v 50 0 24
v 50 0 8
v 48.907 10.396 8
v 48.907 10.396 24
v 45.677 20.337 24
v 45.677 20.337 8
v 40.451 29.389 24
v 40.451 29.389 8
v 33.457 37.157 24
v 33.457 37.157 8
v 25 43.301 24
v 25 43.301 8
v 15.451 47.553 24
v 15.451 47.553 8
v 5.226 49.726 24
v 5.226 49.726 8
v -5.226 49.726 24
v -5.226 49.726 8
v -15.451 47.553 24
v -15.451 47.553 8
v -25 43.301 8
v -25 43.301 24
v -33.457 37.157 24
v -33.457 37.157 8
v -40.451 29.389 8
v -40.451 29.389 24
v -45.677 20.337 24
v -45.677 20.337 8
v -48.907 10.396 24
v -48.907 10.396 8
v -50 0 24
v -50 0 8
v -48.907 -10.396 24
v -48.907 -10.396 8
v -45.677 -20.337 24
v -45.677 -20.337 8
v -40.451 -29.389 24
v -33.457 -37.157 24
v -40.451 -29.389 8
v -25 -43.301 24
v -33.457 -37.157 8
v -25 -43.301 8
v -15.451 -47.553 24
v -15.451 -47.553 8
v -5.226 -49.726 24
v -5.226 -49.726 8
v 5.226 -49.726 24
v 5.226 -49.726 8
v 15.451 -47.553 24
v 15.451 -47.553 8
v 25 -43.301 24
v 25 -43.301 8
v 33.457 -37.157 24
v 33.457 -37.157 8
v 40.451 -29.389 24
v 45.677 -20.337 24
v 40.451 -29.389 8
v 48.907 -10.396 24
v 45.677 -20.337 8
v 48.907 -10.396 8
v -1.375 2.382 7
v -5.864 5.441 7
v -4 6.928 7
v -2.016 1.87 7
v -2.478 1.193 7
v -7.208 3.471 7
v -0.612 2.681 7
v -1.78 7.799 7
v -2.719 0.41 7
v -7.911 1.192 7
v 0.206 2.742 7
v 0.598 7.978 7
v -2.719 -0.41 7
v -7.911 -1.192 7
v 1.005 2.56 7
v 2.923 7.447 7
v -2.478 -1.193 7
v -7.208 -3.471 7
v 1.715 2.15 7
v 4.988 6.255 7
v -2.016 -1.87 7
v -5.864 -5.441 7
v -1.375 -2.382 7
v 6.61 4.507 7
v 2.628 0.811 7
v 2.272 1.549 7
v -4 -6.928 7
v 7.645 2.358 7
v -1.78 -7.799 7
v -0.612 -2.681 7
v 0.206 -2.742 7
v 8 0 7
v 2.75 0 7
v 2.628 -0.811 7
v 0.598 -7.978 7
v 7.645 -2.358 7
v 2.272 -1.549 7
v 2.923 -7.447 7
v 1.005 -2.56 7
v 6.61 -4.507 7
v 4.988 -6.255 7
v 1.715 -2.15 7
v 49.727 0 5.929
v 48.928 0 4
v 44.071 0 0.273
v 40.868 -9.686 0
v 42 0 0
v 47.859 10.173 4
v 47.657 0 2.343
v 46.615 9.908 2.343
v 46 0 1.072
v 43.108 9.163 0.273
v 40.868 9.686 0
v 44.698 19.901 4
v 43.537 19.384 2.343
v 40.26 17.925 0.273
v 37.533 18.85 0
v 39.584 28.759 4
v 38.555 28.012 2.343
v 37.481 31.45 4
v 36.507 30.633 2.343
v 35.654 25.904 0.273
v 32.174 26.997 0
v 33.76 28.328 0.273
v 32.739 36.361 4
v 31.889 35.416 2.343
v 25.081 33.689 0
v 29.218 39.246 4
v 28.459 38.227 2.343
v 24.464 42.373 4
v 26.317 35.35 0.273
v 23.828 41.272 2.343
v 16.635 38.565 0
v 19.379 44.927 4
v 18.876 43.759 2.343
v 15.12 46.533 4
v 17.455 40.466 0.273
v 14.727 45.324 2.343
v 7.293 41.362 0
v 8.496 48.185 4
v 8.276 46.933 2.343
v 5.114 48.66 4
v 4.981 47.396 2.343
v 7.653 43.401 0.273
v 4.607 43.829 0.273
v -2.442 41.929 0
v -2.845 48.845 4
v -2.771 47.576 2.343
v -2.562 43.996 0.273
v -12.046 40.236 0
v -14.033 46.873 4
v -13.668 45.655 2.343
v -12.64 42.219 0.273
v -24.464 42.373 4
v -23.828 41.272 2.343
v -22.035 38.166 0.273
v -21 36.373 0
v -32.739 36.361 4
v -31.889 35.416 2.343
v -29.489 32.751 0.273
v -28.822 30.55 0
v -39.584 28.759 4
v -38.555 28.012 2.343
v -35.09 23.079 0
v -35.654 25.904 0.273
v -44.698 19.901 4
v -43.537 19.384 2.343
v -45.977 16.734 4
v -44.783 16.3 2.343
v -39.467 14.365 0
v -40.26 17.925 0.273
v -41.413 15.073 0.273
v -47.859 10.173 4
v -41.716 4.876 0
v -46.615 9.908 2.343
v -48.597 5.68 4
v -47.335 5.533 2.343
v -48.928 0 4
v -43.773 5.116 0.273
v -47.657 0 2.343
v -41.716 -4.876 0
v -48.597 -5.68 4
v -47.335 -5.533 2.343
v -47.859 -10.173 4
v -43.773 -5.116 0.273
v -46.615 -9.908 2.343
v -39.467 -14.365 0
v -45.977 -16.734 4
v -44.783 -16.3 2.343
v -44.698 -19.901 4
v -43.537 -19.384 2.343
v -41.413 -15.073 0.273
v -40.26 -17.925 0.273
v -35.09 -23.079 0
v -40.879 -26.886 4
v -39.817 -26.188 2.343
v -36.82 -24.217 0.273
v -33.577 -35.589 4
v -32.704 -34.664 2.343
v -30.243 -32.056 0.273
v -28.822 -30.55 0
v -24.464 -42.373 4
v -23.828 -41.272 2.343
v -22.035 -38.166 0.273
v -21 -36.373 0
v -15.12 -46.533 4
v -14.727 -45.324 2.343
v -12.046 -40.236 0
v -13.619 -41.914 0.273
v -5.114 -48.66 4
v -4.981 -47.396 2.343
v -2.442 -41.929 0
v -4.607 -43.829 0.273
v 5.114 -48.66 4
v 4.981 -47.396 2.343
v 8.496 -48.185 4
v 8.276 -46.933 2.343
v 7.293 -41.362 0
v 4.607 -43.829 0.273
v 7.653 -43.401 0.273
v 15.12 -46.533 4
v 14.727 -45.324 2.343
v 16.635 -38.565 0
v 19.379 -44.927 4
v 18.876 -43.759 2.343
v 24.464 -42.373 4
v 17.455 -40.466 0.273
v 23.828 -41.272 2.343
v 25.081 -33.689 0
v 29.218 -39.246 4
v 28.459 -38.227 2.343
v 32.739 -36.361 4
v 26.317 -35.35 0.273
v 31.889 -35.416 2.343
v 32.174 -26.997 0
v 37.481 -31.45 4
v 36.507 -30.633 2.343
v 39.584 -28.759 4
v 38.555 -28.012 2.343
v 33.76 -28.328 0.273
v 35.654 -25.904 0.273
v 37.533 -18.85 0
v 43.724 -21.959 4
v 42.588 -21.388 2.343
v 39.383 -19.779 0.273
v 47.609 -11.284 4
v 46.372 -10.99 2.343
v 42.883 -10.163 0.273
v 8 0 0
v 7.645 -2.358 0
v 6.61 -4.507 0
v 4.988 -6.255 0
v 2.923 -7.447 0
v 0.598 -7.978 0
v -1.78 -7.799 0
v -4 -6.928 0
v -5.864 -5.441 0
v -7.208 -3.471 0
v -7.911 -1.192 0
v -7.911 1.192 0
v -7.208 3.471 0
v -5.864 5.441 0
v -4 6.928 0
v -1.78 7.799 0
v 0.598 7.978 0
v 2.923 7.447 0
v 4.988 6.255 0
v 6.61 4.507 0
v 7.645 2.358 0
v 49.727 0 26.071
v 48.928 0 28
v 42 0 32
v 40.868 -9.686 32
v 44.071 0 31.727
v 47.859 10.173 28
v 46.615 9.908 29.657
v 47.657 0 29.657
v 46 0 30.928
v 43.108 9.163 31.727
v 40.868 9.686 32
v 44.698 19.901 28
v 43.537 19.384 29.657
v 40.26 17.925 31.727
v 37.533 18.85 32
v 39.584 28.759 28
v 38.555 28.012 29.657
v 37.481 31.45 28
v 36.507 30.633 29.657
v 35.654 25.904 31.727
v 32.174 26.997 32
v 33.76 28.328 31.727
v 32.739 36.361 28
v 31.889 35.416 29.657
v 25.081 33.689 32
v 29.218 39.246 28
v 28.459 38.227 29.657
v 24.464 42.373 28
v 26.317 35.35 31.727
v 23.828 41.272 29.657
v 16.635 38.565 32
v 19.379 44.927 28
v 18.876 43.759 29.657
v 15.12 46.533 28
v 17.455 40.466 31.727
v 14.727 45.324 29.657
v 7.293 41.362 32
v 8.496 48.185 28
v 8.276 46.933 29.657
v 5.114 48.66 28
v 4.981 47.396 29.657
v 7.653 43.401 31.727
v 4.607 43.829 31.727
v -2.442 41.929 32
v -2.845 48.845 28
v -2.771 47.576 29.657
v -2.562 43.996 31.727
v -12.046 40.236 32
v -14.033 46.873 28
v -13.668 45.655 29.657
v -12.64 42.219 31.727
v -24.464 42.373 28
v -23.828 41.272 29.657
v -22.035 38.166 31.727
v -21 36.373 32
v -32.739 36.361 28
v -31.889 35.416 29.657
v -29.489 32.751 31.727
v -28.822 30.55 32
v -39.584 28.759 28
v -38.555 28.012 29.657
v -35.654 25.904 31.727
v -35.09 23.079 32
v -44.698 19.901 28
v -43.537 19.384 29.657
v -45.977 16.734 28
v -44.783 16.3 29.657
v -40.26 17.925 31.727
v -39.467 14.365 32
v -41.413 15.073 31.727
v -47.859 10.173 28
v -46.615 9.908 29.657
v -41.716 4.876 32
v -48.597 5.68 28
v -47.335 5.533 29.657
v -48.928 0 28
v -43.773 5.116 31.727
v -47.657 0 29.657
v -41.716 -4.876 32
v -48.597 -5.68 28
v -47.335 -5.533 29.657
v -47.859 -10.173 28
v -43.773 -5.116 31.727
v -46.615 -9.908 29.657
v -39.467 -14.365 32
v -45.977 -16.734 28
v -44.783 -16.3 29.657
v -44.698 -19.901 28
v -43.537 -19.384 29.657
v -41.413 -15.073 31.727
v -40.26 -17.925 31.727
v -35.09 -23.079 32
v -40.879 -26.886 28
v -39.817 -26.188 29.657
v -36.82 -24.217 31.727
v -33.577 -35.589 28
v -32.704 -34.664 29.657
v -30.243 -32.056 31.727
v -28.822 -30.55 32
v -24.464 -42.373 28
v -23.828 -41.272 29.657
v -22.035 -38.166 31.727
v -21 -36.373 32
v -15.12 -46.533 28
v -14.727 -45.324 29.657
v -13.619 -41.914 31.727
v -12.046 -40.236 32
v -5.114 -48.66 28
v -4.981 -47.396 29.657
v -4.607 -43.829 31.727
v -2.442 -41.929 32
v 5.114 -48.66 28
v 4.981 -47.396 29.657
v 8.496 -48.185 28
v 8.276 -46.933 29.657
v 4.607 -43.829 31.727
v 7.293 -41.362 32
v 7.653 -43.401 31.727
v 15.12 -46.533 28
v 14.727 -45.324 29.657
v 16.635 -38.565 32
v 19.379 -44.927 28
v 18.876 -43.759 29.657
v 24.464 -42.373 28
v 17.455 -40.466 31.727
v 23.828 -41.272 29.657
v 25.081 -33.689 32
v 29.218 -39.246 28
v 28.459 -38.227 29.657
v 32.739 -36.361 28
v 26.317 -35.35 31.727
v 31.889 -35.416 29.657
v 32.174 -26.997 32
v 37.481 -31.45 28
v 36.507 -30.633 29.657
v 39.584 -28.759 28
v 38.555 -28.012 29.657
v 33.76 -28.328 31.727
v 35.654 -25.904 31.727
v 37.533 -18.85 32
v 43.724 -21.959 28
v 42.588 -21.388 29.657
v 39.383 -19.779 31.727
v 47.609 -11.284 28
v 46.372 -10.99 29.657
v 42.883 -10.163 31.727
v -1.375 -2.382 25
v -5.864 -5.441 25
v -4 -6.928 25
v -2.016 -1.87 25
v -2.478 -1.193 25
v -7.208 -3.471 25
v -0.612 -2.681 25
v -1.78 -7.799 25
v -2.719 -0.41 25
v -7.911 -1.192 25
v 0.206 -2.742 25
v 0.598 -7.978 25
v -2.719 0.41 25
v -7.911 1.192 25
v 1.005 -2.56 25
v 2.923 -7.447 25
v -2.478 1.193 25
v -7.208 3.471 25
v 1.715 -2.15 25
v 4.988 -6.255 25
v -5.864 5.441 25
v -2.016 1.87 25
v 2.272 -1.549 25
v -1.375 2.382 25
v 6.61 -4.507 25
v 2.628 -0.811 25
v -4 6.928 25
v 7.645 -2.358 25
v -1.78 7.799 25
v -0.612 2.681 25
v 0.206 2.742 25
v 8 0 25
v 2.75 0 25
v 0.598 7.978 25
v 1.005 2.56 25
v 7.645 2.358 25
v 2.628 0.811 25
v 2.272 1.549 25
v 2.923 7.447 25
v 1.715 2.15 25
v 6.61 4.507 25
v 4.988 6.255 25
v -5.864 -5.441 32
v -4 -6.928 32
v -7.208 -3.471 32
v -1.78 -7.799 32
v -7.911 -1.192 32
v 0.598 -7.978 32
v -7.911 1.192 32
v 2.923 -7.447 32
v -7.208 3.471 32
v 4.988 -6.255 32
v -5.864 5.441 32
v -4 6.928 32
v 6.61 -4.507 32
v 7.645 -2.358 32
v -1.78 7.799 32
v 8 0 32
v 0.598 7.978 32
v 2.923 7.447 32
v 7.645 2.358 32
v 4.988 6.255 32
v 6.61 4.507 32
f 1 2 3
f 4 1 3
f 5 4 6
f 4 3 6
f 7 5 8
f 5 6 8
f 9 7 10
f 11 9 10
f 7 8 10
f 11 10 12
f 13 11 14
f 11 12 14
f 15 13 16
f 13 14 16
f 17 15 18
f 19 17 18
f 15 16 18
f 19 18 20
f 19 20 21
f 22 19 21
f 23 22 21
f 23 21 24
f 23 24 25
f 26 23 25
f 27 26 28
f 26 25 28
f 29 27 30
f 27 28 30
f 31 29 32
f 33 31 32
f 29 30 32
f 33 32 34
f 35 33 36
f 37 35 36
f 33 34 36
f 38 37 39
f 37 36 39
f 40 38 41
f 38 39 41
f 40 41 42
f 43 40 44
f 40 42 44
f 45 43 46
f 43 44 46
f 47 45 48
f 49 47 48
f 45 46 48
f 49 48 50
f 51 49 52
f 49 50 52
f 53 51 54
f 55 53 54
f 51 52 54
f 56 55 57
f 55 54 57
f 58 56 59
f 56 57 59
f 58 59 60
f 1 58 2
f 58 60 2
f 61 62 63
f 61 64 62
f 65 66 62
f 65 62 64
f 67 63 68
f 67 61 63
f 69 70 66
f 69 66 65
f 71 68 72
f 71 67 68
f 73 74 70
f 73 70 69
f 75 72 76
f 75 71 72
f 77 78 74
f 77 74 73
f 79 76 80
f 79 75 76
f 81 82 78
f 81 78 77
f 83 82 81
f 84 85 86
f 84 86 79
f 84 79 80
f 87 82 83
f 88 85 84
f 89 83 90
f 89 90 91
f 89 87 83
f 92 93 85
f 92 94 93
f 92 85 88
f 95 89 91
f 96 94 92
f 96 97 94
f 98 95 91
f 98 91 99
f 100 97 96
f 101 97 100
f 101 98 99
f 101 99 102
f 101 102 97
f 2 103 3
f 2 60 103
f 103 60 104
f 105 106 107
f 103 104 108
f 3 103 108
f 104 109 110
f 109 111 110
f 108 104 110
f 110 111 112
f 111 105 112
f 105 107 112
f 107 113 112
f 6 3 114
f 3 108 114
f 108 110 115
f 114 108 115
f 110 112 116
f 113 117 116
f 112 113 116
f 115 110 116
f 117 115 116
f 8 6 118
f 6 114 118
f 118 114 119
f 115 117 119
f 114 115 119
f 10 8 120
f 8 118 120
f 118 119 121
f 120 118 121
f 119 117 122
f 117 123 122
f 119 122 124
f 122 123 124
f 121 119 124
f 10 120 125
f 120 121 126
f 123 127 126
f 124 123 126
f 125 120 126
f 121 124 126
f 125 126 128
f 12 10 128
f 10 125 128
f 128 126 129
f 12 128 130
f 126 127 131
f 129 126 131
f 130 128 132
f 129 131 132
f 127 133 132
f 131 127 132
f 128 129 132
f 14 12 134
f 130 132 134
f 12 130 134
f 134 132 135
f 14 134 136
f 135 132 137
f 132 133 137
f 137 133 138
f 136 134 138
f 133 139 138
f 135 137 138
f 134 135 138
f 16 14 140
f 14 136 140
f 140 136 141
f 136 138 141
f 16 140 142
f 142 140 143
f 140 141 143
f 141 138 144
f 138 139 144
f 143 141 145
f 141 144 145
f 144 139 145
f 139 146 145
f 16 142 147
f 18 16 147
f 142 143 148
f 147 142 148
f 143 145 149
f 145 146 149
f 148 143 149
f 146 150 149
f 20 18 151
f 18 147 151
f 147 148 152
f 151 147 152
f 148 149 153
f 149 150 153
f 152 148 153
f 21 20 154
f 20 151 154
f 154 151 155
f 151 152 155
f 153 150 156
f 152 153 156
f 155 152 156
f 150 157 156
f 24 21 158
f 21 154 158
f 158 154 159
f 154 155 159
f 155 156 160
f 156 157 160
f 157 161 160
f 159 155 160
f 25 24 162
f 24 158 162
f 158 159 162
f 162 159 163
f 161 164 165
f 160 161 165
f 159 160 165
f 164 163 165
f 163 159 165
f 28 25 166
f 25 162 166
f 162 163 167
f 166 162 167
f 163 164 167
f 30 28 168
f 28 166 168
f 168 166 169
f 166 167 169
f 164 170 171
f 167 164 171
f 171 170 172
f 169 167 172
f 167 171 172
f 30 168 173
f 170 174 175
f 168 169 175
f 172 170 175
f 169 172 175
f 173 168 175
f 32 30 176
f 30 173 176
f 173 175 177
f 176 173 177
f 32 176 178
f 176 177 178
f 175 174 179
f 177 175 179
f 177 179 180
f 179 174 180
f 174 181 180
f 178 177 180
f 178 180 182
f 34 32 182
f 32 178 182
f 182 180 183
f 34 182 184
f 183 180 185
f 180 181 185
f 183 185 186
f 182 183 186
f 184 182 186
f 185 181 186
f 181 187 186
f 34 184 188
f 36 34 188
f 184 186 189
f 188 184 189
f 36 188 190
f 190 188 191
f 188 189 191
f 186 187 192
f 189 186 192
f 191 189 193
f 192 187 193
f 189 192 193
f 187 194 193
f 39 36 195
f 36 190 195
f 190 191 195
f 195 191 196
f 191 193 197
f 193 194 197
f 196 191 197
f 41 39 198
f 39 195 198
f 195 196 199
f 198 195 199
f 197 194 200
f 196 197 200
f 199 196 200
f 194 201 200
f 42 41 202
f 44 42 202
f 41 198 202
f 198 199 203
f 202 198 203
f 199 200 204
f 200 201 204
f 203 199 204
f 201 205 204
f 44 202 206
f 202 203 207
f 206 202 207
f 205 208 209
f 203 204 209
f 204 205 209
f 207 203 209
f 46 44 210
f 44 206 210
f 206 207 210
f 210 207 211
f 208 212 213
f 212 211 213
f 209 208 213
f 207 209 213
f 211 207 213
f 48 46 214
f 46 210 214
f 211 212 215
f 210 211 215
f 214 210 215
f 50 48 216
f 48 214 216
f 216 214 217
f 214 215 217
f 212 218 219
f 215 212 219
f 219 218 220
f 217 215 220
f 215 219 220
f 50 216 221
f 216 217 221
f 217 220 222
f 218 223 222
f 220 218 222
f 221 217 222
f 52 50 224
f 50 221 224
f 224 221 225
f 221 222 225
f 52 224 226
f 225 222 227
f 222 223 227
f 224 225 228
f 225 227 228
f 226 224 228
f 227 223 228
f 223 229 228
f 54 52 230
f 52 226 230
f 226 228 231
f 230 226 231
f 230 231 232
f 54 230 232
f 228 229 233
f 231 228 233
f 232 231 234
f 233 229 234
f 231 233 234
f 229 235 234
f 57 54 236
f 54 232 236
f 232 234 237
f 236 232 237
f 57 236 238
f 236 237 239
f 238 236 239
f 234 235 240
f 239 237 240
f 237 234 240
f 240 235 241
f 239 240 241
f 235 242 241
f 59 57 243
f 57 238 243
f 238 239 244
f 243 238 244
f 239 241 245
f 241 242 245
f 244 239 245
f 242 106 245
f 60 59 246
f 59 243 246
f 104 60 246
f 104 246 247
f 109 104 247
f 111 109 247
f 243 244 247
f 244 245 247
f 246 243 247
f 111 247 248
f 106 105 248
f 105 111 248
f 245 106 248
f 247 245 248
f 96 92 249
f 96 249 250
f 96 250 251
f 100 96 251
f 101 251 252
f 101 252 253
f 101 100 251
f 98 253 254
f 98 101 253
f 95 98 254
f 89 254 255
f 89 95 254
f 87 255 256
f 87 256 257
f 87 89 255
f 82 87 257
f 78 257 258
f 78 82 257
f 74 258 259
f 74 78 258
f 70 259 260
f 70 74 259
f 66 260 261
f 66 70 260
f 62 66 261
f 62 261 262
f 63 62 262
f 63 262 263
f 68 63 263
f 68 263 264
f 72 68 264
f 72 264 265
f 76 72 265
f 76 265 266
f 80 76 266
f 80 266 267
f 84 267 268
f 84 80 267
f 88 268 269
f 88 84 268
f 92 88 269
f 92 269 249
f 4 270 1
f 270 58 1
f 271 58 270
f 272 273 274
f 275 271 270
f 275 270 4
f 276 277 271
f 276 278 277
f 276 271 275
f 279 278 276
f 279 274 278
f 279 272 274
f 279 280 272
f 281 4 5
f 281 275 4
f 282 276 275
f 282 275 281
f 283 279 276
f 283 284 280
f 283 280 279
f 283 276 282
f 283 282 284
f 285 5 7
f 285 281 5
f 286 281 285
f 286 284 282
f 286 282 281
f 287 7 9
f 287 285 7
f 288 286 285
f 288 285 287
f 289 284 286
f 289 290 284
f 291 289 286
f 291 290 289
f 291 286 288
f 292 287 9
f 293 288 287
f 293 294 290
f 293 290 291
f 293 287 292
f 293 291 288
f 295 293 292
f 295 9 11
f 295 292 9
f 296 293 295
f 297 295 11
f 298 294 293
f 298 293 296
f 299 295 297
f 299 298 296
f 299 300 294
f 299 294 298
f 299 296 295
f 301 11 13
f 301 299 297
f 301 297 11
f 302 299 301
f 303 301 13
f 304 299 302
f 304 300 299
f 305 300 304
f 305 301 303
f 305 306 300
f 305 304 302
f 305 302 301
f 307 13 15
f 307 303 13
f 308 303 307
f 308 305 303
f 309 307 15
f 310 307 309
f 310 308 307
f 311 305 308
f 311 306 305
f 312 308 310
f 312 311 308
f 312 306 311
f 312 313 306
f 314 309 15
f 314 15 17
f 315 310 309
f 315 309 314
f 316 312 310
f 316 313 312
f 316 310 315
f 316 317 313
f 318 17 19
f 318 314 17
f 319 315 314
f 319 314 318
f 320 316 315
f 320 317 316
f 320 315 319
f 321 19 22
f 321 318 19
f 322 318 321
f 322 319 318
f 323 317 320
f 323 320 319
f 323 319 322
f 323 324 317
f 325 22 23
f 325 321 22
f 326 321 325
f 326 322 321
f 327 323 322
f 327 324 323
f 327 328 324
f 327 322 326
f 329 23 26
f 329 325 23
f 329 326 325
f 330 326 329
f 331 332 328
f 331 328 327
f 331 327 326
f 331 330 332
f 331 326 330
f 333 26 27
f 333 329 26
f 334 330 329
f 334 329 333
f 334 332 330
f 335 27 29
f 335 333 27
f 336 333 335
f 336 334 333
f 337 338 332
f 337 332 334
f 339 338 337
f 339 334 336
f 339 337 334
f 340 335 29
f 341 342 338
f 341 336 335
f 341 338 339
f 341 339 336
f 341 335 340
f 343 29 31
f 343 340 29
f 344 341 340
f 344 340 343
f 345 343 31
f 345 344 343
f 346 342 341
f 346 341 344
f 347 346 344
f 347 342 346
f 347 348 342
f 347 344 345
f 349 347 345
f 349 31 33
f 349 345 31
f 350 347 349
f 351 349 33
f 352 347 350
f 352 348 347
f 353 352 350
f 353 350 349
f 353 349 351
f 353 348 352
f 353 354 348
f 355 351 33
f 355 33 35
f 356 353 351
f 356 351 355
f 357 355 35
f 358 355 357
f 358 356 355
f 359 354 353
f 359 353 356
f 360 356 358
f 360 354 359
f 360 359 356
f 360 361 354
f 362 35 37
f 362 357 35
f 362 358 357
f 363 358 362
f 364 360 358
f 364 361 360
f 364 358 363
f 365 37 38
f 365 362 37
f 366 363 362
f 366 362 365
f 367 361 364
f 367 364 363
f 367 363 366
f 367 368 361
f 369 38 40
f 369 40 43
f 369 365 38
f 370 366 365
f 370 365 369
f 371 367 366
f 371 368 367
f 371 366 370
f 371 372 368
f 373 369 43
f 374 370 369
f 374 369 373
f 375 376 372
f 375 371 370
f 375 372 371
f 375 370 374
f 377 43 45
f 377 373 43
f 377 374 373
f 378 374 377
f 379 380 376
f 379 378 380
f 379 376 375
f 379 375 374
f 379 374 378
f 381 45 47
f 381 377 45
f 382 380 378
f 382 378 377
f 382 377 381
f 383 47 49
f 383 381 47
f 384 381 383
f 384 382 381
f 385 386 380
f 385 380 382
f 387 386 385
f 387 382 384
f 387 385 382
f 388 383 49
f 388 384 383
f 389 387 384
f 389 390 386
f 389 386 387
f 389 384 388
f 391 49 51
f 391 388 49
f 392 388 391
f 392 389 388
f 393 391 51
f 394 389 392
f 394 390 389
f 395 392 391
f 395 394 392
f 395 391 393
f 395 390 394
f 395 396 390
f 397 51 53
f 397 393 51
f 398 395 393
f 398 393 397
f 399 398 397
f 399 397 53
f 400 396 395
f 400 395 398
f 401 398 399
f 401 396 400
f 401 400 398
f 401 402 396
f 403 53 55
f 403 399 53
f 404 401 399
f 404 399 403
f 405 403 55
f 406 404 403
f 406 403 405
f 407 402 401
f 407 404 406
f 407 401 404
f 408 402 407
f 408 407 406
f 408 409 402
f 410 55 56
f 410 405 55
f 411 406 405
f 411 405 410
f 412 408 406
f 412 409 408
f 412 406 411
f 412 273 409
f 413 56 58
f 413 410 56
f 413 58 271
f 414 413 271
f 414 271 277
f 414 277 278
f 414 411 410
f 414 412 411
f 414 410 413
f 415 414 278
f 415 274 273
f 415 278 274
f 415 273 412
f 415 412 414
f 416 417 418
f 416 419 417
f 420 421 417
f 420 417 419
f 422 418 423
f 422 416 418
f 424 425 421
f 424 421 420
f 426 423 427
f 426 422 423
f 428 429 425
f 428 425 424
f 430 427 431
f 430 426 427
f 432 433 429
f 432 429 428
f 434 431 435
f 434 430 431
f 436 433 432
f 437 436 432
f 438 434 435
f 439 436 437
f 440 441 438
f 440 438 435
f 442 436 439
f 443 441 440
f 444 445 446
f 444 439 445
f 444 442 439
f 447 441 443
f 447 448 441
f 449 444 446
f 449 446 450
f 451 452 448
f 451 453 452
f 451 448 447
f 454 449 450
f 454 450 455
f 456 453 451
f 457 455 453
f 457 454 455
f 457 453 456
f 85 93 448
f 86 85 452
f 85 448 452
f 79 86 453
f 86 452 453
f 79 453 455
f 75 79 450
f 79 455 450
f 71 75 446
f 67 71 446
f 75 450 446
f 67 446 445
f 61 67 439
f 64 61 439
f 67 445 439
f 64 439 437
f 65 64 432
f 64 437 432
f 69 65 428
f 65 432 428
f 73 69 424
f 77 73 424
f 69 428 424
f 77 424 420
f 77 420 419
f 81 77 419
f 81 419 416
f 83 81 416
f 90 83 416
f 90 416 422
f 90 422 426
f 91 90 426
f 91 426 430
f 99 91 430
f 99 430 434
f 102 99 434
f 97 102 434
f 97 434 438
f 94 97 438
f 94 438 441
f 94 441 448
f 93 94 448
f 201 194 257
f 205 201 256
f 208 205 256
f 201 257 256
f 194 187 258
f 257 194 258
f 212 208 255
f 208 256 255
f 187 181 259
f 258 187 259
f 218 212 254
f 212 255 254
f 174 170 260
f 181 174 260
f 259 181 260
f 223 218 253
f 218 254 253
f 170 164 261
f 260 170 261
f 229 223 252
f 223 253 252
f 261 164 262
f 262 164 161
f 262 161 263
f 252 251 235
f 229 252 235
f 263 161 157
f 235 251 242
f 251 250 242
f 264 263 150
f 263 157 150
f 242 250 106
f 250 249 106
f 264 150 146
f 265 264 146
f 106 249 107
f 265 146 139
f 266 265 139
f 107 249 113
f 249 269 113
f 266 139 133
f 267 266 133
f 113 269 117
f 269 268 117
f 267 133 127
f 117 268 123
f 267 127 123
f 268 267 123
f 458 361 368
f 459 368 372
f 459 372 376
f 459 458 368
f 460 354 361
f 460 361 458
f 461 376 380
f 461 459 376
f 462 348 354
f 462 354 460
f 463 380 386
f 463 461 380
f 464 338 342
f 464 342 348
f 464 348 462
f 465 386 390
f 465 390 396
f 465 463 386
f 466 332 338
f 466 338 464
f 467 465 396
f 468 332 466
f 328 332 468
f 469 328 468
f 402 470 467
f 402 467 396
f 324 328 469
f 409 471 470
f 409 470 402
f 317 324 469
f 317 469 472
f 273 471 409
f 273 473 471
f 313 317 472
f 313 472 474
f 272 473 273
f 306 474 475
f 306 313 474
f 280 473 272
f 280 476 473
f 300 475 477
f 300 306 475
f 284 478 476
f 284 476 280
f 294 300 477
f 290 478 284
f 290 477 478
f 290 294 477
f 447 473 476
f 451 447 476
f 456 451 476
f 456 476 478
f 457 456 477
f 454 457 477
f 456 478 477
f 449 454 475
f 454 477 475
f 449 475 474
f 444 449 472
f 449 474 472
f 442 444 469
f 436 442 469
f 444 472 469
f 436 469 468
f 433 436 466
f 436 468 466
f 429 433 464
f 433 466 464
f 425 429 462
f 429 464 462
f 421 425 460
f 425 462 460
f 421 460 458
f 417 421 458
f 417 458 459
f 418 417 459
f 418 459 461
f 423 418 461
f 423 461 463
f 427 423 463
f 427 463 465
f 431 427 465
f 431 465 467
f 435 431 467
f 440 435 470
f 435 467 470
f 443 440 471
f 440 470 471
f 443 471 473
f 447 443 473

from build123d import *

# Parameters (mm, degrees)
SKETCH_1_R          = 50
EXTRUDE_1_DEPTH     = 32
SKETCH_2_R          = 2.75
CUT_EXTRUDE_1_DEPTH = 78.614431648
FILLET_1_R          = 8
SKETCH_3_R          = 8
CUT_EXTRUDE_2_DEPTH = 7
CUT_EXTRUDE_START   = -7
SKETCH_4_R          = 8
CUT_EXTRUDE_3_DEPTH = 7


with BuildPart() as part:
    # 草图1 → 凸台-拉伸1 (new body)
    with BuildSketch(Plane.XY):
        Circle(SKETCH_1_R)
    extrude(amount=EXTRUDE_1_DEPTH)

    # 草图2 → 切除-拉伸1 (cut, through all)
    with BuildSketch(Plane.XY.offset(32)):
        Circle(SKETCH_2_R)
    extrude(amount=-CUT_EXTRUDE_1_DEPTH, mode=Mode.SUBTRACT)

    # 圆角1
    fillet_1_edges = [part.edges().sort_by_distance(p)[0] for p in [
        (-50, 0, 0),
        (-50, 0, 32),
    ]]
    fillet(fillet_1_edges, radius=FILLET_1_R)

    # 草图3 → 切除-拉伸2 (cut)
    with BuildSketch(Plane.XY.offset(32)):
        Circle(SKETCH_3_R)
    extrude(amount=-CUT_EXTRUDE_2_DEPTH, mode=Mode.SUBTRACT)

    # 草图4 → 切除-拉伸3 (cut)
    with BuildSketch(Plane(origin=(0, 0, 0), x_dir=(-1, 0, 0), z_dir=(0, 0, -1)).offset(CUT_EXTRUDE_START)):
        with Locations(Location((0, 0, 0), (0, 0, 180))):
            Circle(SKETCH_4_R)
    extrude(amount=CUT_EXTRUDE_3_DEPTH, mode=Mode.SUBTRACT)


solid = part.part
